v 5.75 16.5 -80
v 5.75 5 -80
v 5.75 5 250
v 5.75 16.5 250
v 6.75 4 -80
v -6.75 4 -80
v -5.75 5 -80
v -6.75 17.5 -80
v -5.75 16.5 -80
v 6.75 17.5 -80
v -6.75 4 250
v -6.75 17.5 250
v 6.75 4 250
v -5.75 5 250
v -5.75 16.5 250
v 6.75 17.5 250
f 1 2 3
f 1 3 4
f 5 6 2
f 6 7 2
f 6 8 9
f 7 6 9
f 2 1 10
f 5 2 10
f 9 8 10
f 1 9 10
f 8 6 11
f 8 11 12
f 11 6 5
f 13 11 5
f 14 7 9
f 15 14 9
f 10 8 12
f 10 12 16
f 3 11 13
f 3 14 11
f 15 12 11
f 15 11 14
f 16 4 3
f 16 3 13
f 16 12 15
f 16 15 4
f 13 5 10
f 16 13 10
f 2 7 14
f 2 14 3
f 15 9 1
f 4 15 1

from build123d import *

# Parameters (mm, degrees)
SALIENTE_EXTRUIR1_START = -80
CROQUIS1_W              = 13.5
CROQUIS1_H              = 13.5
CROQUIS1_W_2            = 11.5
CROQUIS1_H_2            = 11.5
SALIENTE_EXTRUIR1_DEPTH = 330


with BuildPart() as part:
    # Croquis1 → Saliente-Extruir1 (new body)
    with BuildSketch(Plane.XY.offset(SALIENTE_EXTRUIR1_START)):
        with Locations((0, 10.75)):
            Rectangle(CROQUIS1_W, CROQUIS1_H)
        with Locations((0, 10.75)):
            Rectangle(CROQUIS1_W_2, CROQUIS1_H_2, mode=Mode.SUBTRACT)
    extrude(amount=SALIENTE_EXTRUIR1_DEPTH)


solid = part.part
